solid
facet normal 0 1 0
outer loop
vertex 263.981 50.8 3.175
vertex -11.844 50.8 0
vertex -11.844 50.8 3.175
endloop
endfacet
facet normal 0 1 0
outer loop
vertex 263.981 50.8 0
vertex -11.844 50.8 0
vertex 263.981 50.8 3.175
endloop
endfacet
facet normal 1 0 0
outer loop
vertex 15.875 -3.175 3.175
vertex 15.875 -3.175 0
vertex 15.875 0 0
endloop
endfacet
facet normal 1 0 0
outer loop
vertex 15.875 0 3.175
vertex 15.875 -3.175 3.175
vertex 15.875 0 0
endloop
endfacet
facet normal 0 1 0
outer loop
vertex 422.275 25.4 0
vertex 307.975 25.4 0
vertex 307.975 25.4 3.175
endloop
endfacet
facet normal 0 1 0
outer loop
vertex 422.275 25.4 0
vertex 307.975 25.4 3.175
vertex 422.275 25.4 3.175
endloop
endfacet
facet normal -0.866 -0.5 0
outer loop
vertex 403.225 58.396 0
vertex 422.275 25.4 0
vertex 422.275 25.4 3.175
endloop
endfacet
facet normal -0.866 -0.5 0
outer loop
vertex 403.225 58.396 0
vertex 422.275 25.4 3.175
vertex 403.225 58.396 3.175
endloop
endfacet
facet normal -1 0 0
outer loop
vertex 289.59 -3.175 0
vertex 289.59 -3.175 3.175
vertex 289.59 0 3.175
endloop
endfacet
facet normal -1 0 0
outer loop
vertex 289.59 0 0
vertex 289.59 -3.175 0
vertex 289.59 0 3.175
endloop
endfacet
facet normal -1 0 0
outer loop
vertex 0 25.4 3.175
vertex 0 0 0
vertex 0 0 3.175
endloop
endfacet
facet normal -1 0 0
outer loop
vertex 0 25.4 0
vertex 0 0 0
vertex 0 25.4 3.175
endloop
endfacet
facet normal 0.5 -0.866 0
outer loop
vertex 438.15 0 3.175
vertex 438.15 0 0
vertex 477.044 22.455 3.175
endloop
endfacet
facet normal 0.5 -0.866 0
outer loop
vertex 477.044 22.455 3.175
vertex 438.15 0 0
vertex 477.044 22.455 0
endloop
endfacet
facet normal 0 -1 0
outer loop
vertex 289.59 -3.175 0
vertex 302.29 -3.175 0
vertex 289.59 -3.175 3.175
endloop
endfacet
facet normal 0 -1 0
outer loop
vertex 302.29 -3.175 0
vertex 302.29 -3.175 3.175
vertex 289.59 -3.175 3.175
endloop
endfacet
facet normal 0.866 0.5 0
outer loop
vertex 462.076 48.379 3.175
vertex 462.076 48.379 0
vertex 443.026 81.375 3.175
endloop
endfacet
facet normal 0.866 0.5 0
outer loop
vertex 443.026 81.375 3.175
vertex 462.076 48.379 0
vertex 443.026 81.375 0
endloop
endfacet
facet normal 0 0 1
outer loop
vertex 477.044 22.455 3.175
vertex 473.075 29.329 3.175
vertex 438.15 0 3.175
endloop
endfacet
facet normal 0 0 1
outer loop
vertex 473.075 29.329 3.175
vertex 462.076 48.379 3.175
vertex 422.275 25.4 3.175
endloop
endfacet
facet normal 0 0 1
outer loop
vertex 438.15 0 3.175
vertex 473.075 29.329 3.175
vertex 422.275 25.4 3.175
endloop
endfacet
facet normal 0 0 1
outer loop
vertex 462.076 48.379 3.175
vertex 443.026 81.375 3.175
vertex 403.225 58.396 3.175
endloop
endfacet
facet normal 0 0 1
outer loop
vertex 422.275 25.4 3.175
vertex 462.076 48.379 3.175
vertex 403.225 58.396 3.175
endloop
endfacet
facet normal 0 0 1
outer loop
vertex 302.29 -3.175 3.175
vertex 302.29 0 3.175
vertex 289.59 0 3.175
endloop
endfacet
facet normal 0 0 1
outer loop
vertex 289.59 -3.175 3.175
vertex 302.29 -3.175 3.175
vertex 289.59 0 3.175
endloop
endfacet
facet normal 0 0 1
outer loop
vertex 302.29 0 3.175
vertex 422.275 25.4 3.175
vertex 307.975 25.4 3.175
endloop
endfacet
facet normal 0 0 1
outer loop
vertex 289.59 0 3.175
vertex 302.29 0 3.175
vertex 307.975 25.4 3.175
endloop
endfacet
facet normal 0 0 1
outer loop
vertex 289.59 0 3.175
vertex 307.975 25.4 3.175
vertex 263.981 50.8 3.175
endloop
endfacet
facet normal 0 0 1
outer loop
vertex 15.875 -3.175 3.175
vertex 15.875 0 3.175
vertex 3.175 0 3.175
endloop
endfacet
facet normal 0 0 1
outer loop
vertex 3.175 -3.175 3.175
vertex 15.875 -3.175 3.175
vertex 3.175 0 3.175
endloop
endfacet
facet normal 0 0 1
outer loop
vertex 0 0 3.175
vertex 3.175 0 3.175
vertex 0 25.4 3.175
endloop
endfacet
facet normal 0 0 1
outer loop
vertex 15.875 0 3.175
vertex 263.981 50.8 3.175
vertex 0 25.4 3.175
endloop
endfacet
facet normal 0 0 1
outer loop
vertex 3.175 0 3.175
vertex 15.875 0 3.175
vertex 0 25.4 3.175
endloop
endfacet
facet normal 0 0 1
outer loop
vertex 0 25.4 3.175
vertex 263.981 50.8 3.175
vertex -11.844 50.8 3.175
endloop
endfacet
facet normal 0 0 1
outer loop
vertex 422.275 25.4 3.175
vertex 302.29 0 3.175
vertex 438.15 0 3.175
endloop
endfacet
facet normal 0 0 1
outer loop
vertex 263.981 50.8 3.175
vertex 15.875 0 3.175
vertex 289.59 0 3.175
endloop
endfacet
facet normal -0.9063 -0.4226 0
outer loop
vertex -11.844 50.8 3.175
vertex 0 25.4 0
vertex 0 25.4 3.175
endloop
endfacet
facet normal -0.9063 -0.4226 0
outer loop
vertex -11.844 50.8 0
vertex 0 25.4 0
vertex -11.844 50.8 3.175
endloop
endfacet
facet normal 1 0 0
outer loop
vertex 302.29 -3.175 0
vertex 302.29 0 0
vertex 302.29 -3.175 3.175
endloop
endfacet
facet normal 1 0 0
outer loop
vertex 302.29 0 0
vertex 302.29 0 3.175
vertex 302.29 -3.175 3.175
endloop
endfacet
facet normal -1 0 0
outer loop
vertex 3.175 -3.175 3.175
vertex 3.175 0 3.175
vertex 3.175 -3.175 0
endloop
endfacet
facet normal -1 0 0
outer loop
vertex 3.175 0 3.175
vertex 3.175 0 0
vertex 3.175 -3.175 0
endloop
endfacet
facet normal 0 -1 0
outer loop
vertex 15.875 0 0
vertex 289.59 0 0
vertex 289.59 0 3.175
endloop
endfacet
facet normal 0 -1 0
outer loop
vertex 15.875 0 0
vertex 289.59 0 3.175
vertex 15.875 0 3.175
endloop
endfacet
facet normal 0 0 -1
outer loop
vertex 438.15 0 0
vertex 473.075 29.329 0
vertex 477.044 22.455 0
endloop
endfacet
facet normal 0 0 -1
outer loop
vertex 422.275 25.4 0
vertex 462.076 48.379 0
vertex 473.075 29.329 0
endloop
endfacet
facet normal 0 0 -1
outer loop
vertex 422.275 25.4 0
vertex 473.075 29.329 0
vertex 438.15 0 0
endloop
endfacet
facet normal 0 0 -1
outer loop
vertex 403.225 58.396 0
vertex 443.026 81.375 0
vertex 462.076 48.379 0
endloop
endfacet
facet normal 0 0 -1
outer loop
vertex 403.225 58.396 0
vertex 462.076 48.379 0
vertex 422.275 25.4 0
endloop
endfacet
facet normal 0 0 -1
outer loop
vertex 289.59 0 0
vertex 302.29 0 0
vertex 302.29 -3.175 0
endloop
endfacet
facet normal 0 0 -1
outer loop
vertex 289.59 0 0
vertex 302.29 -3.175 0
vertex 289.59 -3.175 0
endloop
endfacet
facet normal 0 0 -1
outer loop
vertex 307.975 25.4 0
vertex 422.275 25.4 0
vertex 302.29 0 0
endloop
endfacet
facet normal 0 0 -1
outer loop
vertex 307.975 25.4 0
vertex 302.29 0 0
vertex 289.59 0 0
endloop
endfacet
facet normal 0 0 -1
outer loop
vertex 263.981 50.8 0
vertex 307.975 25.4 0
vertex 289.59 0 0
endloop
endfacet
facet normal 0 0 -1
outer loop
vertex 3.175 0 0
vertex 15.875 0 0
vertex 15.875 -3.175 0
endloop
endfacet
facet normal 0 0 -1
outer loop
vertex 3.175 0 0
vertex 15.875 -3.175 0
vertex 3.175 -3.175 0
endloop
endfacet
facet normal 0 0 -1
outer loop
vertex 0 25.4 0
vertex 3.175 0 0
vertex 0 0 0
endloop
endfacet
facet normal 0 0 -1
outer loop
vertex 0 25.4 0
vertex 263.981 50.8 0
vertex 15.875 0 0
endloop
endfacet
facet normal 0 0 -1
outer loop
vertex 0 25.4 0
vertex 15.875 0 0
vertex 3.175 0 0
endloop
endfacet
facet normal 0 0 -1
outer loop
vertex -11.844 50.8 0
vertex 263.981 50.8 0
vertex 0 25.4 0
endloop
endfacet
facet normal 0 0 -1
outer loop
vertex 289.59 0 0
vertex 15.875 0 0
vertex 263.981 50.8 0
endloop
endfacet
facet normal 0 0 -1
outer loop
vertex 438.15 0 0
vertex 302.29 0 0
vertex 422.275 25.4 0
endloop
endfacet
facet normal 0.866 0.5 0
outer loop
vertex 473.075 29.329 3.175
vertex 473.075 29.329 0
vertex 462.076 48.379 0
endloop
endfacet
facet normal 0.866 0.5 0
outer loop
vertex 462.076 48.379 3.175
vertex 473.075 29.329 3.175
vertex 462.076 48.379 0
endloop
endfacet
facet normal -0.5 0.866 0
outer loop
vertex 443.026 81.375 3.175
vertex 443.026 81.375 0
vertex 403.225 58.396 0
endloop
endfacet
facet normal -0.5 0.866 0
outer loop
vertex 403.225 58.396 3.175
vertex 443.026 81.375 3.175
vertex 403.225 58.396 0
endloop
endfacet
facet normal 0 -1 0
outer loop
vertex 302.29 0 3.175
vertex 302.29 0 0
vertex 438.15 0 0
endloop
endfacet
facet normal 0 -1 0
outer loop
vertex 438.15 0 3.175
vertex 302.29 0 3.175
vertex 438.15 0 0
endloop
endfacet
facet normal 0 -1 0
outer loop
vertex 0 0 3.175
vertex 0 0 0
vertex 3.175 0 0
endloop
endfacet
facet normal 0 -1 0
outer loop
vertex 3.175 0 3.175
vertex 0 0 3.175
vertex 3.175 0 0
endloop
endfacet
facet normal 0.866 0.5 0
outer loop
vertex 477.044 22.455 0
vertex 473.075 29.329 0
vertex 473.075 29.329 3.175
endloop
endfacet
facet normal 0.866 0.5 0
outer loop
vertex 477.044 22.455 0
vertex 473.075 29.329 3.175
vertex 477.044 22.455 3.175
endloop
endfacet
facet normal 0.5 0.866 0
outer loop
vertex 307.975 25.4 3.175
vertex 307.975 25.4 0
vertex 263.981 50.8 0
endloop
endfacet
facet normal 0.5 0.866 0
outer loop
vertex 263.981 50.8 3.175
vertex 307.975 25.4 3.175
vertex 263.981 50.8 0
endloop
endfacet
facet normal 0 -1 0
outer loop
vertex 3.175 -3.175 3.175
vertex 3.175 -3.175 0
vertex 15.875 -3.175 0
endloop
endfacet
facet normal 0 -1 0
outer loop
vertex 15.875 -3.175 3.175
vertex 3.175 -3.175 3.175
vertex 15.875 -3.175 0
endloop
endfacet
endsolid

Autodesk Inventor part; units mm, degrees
ref_plane "YZ Plane" through (0, 0, 0) normal (1, 0, 0) x (0, 1, 0)
ref_plane "XZ Plane" through (0, 0, 0) normal (0, 1, 0) x (-1, 0, 0)
ref_plane "XY Plane" through (0, 0, 0) normal (0, 0, 1) x (1, 0, 0)
sketch "Sketch1" plane through (0, 0, 0) normal (0, 0, 1) x (1, 0, 0)
  line L0 (0, 0) -> (3.175, 0)
  line L1 (3.175, 0) -> (3.175, -3.175)
  line L2 (3.175, -3.175) -> (15.875, -3.175)
  line L3 (15.875, -3.175) -> (15.875, 0)
  line L4 (0, 0) -> (0, 25.4)
  line L5 (307.975, 0) -> (15.875, 0)
  line L6 (0, 25.4) -> (-11.8442, 50.8)
  line L7 (307.975, 25.4) -> (263.9809, 50.8)
  line L8 (-11.8442, 50.8) -> (263.9809, 50.8)
  line L9 (358.775, 0) -> (422.275, 0)
  line L10 (307.975, 0) -> (358.775, 0)
  line L11 (307.975, 25.4) -> (384.175, 25.4)
  line L12 (384.175, 241.3) -> (422.275, 241.3)
  line L13 (588.0391, 190.1261) -> (586.2287, 190.1261) projected
  line L14 (586.2287, 218.7011) -> (586.2287, 190.1261) projected
  line L15 (588.0391, 218.7011) -> (586.2287, 218.7011) projected
  line L16 (588.0391, 190.1261) -> (588.0391, 218.7011) projected
  line L17 (588.0391, 38.1) -> (586.2287, 38.1) projected
  line L18 (586.2287, 177.4261) -> (586.2287, 38.1) projected
  line L19 (586.2287, 177.4261) -> (588.0391, 177.4261) projected
  line L20 (588.0391, 38.1) -> (588.0391, 177.4261) projected
  line L21 (588.0391, 190.1261) -> (588.0391, 218.7011) projected
  line L22 (588.0391, 190.1261) -> (586.2287, 190.1261) projected
  line L23 (586.2287, 218.7011) -> (586.2287, 190.1261) projected
  line L24 (588.0391, 218.7011) -> (586.2287, 218.7011) projected
  line L25 (588.0391, 190.1261) -> (588.0391, 218.7011) projected
  line L26 (431.5435, 218.7011) -> (431.5435, 12.7) projected
  line L27 (431.5435, 218.7011) -> (429.7331, 218.7011) projected
  line L28 (429.7331, 12.7) -> (429.7331, 218.7011) projected
  line L29 (431.5435, 12.7) -> (429.7331, 12.7) projected
  line L30 (384.175, 25.4) -> (422.275, 25.4)
  line L31 (422.275, 0) -> (422.275, 25.4)
  dimension "d0" = 3.175
  dimension "d1" = 3.175
  dimension "d2" = 12.7
  dimension "d3" = 25.4
  dimension "d4" = 307.975
  dimension "d12" = 25.4
  dimension "d13" = 25
  dimension "d17" = 25.4
  dimension "d19" = 150
  dimension "d21" = 25.4
  dimension "d25" = 0
  dimension "d36" = 215.9
  dimension "d37" = 38.1
  dimension "d44" = 76.2
extrude "Extrusion1" add sketch "Sketch1" along normal blind 3.175 contours L4 L6 L8 L7 L11 L30 L31 L9 L10 L5 L3 L2 L1 L0
sketch "Sketch2" plane through (0, 0, 3.175) normal (0, 0, 1) x (1, 0, 0)
  line L0 (289.5902, 0) -> (302.2902, 0) projected
  line L1 (289.5902, -3.175) -> (289.5902, 0) projected
  line L2 (302.2902, -3.175) -> (289.5902, -3.175) projected
  line L3 (302.2902, 0) -> (302.2902, -3.175) projected
extrude "Extrusion2" add sketch "Sketch2" against normal blind 3.175
sketch "Sketch6" plane through (0, 0, 0) normal (0, 0, -1) x (-1, 0, 0)
  line L0 (-422.275, 0) -> (-422.275, 50.8) projected
  line L1 (-422.275, 0) -> (-473.075, 29.3294)
  line L2 (-462.0765, 48.3794) -> (-422.275, 25.4)
  line L3 (-473.075, 29.3294) -> (-462.0765, 48.3794)
  point P0 (-407.9875, 50.8)
  dimension "d53" = 60
extrude "Extrusion6" add sketch "Sketch6" against normal blind 3.175
sketch "Sketch7" plane through (0, 0, 0) normal (0, 0, -1) x (-1, 0, 0)
  line L0 (-473.075, 29.3294) -> (-422.275, 0) projected
  line L1 (-3.175, 0) -> (-3.175, -3.175) projected
  line L2 (-422.275, 0) -> (-438.15, 0)
  line L3 (-438.15, 0) -> (-477.0438, 22.4553)
  line L4 (-473.075, 29.3294) -> (-477.0438, 22.4553)
  dimension "d58" = 15.875
extrude "Extrusion7" add sketch "Sketch7" against normal blind 3.175
sketch "Sketch8" plane through (0, 0, 0) normal (0, 0, -1) x (-1, 0, 0)
  line L0 (-422.275, 25.4) -> (-462.0765, 48.3794) projected
  line L1 (-477.0438, 22.4553) -> (-438.15, 0) projected
  line L2 (-422.275, 25.4) -> (-403.225, 58.3956)
  line L3 (-462.0765, 48.3794) -> (-443.0265, 81.375)
  line L4 (-443.0265, 81.375) -> (-403.225, 58.3956)
  dimension "d61" = 38.1
  dimension "d62" = 38.1
extrude "Extrusion8" add sketch "Sketch8" against normal blind 3.175
sketch "Sketch9" plane through (0, 0, 3.175) normal (0, 0, 1) x (1, 0, 0)
  line L0 (0, 0) -> (3.175, 0) projected
  line L1 (3.175, 0) -> (3.175, -3.175) projected
  line L2 (3.175, -3.175) -> (15.875, -3.175) projected
  line L3 (15.875, -3.175) -> (15.875, 0) projected
  line L4 (15.875, 0) -> (289.5902, 0) projected
  line L5 (289.5902, 0) -> (289.5902, -3.175) projected
  line L6 (289.5902, -3.175) -> (302.2902, -3.175) projected
  line L7 (302.2902, -3.175) -> (302.2902, 0) projected
  line L8 (302.2902, 0) -> (438.15, 0) projected
  line L9 (438.15, 0) -> (477.0438, 22.4553) projected
  line L10 (477.0438, 22.4553) -> (443.0265, 81.375) projected
  line L11 (443.0265, 81.375) -> (403.225, 58.3956) projected
  line L12 (403.225, 58.3956) -> (422.275, 25.4) projected
  line L13 (422.275, 25.4) -> (307.975, 25.4) projected
  line L14 (307.975, 25.4) -> (263.9809, 50.8) projected
  line L15 (263.9809, 50.8) -> (-11.8442, 50.8) projected
  line L16 (-11.8442, 50.8) -> (0, 25.4) projected
  line L17 (0, 25.4) -> (0, 0) projected
properties part number "Side Wall 2" material "Polycarbonate, Clear"
